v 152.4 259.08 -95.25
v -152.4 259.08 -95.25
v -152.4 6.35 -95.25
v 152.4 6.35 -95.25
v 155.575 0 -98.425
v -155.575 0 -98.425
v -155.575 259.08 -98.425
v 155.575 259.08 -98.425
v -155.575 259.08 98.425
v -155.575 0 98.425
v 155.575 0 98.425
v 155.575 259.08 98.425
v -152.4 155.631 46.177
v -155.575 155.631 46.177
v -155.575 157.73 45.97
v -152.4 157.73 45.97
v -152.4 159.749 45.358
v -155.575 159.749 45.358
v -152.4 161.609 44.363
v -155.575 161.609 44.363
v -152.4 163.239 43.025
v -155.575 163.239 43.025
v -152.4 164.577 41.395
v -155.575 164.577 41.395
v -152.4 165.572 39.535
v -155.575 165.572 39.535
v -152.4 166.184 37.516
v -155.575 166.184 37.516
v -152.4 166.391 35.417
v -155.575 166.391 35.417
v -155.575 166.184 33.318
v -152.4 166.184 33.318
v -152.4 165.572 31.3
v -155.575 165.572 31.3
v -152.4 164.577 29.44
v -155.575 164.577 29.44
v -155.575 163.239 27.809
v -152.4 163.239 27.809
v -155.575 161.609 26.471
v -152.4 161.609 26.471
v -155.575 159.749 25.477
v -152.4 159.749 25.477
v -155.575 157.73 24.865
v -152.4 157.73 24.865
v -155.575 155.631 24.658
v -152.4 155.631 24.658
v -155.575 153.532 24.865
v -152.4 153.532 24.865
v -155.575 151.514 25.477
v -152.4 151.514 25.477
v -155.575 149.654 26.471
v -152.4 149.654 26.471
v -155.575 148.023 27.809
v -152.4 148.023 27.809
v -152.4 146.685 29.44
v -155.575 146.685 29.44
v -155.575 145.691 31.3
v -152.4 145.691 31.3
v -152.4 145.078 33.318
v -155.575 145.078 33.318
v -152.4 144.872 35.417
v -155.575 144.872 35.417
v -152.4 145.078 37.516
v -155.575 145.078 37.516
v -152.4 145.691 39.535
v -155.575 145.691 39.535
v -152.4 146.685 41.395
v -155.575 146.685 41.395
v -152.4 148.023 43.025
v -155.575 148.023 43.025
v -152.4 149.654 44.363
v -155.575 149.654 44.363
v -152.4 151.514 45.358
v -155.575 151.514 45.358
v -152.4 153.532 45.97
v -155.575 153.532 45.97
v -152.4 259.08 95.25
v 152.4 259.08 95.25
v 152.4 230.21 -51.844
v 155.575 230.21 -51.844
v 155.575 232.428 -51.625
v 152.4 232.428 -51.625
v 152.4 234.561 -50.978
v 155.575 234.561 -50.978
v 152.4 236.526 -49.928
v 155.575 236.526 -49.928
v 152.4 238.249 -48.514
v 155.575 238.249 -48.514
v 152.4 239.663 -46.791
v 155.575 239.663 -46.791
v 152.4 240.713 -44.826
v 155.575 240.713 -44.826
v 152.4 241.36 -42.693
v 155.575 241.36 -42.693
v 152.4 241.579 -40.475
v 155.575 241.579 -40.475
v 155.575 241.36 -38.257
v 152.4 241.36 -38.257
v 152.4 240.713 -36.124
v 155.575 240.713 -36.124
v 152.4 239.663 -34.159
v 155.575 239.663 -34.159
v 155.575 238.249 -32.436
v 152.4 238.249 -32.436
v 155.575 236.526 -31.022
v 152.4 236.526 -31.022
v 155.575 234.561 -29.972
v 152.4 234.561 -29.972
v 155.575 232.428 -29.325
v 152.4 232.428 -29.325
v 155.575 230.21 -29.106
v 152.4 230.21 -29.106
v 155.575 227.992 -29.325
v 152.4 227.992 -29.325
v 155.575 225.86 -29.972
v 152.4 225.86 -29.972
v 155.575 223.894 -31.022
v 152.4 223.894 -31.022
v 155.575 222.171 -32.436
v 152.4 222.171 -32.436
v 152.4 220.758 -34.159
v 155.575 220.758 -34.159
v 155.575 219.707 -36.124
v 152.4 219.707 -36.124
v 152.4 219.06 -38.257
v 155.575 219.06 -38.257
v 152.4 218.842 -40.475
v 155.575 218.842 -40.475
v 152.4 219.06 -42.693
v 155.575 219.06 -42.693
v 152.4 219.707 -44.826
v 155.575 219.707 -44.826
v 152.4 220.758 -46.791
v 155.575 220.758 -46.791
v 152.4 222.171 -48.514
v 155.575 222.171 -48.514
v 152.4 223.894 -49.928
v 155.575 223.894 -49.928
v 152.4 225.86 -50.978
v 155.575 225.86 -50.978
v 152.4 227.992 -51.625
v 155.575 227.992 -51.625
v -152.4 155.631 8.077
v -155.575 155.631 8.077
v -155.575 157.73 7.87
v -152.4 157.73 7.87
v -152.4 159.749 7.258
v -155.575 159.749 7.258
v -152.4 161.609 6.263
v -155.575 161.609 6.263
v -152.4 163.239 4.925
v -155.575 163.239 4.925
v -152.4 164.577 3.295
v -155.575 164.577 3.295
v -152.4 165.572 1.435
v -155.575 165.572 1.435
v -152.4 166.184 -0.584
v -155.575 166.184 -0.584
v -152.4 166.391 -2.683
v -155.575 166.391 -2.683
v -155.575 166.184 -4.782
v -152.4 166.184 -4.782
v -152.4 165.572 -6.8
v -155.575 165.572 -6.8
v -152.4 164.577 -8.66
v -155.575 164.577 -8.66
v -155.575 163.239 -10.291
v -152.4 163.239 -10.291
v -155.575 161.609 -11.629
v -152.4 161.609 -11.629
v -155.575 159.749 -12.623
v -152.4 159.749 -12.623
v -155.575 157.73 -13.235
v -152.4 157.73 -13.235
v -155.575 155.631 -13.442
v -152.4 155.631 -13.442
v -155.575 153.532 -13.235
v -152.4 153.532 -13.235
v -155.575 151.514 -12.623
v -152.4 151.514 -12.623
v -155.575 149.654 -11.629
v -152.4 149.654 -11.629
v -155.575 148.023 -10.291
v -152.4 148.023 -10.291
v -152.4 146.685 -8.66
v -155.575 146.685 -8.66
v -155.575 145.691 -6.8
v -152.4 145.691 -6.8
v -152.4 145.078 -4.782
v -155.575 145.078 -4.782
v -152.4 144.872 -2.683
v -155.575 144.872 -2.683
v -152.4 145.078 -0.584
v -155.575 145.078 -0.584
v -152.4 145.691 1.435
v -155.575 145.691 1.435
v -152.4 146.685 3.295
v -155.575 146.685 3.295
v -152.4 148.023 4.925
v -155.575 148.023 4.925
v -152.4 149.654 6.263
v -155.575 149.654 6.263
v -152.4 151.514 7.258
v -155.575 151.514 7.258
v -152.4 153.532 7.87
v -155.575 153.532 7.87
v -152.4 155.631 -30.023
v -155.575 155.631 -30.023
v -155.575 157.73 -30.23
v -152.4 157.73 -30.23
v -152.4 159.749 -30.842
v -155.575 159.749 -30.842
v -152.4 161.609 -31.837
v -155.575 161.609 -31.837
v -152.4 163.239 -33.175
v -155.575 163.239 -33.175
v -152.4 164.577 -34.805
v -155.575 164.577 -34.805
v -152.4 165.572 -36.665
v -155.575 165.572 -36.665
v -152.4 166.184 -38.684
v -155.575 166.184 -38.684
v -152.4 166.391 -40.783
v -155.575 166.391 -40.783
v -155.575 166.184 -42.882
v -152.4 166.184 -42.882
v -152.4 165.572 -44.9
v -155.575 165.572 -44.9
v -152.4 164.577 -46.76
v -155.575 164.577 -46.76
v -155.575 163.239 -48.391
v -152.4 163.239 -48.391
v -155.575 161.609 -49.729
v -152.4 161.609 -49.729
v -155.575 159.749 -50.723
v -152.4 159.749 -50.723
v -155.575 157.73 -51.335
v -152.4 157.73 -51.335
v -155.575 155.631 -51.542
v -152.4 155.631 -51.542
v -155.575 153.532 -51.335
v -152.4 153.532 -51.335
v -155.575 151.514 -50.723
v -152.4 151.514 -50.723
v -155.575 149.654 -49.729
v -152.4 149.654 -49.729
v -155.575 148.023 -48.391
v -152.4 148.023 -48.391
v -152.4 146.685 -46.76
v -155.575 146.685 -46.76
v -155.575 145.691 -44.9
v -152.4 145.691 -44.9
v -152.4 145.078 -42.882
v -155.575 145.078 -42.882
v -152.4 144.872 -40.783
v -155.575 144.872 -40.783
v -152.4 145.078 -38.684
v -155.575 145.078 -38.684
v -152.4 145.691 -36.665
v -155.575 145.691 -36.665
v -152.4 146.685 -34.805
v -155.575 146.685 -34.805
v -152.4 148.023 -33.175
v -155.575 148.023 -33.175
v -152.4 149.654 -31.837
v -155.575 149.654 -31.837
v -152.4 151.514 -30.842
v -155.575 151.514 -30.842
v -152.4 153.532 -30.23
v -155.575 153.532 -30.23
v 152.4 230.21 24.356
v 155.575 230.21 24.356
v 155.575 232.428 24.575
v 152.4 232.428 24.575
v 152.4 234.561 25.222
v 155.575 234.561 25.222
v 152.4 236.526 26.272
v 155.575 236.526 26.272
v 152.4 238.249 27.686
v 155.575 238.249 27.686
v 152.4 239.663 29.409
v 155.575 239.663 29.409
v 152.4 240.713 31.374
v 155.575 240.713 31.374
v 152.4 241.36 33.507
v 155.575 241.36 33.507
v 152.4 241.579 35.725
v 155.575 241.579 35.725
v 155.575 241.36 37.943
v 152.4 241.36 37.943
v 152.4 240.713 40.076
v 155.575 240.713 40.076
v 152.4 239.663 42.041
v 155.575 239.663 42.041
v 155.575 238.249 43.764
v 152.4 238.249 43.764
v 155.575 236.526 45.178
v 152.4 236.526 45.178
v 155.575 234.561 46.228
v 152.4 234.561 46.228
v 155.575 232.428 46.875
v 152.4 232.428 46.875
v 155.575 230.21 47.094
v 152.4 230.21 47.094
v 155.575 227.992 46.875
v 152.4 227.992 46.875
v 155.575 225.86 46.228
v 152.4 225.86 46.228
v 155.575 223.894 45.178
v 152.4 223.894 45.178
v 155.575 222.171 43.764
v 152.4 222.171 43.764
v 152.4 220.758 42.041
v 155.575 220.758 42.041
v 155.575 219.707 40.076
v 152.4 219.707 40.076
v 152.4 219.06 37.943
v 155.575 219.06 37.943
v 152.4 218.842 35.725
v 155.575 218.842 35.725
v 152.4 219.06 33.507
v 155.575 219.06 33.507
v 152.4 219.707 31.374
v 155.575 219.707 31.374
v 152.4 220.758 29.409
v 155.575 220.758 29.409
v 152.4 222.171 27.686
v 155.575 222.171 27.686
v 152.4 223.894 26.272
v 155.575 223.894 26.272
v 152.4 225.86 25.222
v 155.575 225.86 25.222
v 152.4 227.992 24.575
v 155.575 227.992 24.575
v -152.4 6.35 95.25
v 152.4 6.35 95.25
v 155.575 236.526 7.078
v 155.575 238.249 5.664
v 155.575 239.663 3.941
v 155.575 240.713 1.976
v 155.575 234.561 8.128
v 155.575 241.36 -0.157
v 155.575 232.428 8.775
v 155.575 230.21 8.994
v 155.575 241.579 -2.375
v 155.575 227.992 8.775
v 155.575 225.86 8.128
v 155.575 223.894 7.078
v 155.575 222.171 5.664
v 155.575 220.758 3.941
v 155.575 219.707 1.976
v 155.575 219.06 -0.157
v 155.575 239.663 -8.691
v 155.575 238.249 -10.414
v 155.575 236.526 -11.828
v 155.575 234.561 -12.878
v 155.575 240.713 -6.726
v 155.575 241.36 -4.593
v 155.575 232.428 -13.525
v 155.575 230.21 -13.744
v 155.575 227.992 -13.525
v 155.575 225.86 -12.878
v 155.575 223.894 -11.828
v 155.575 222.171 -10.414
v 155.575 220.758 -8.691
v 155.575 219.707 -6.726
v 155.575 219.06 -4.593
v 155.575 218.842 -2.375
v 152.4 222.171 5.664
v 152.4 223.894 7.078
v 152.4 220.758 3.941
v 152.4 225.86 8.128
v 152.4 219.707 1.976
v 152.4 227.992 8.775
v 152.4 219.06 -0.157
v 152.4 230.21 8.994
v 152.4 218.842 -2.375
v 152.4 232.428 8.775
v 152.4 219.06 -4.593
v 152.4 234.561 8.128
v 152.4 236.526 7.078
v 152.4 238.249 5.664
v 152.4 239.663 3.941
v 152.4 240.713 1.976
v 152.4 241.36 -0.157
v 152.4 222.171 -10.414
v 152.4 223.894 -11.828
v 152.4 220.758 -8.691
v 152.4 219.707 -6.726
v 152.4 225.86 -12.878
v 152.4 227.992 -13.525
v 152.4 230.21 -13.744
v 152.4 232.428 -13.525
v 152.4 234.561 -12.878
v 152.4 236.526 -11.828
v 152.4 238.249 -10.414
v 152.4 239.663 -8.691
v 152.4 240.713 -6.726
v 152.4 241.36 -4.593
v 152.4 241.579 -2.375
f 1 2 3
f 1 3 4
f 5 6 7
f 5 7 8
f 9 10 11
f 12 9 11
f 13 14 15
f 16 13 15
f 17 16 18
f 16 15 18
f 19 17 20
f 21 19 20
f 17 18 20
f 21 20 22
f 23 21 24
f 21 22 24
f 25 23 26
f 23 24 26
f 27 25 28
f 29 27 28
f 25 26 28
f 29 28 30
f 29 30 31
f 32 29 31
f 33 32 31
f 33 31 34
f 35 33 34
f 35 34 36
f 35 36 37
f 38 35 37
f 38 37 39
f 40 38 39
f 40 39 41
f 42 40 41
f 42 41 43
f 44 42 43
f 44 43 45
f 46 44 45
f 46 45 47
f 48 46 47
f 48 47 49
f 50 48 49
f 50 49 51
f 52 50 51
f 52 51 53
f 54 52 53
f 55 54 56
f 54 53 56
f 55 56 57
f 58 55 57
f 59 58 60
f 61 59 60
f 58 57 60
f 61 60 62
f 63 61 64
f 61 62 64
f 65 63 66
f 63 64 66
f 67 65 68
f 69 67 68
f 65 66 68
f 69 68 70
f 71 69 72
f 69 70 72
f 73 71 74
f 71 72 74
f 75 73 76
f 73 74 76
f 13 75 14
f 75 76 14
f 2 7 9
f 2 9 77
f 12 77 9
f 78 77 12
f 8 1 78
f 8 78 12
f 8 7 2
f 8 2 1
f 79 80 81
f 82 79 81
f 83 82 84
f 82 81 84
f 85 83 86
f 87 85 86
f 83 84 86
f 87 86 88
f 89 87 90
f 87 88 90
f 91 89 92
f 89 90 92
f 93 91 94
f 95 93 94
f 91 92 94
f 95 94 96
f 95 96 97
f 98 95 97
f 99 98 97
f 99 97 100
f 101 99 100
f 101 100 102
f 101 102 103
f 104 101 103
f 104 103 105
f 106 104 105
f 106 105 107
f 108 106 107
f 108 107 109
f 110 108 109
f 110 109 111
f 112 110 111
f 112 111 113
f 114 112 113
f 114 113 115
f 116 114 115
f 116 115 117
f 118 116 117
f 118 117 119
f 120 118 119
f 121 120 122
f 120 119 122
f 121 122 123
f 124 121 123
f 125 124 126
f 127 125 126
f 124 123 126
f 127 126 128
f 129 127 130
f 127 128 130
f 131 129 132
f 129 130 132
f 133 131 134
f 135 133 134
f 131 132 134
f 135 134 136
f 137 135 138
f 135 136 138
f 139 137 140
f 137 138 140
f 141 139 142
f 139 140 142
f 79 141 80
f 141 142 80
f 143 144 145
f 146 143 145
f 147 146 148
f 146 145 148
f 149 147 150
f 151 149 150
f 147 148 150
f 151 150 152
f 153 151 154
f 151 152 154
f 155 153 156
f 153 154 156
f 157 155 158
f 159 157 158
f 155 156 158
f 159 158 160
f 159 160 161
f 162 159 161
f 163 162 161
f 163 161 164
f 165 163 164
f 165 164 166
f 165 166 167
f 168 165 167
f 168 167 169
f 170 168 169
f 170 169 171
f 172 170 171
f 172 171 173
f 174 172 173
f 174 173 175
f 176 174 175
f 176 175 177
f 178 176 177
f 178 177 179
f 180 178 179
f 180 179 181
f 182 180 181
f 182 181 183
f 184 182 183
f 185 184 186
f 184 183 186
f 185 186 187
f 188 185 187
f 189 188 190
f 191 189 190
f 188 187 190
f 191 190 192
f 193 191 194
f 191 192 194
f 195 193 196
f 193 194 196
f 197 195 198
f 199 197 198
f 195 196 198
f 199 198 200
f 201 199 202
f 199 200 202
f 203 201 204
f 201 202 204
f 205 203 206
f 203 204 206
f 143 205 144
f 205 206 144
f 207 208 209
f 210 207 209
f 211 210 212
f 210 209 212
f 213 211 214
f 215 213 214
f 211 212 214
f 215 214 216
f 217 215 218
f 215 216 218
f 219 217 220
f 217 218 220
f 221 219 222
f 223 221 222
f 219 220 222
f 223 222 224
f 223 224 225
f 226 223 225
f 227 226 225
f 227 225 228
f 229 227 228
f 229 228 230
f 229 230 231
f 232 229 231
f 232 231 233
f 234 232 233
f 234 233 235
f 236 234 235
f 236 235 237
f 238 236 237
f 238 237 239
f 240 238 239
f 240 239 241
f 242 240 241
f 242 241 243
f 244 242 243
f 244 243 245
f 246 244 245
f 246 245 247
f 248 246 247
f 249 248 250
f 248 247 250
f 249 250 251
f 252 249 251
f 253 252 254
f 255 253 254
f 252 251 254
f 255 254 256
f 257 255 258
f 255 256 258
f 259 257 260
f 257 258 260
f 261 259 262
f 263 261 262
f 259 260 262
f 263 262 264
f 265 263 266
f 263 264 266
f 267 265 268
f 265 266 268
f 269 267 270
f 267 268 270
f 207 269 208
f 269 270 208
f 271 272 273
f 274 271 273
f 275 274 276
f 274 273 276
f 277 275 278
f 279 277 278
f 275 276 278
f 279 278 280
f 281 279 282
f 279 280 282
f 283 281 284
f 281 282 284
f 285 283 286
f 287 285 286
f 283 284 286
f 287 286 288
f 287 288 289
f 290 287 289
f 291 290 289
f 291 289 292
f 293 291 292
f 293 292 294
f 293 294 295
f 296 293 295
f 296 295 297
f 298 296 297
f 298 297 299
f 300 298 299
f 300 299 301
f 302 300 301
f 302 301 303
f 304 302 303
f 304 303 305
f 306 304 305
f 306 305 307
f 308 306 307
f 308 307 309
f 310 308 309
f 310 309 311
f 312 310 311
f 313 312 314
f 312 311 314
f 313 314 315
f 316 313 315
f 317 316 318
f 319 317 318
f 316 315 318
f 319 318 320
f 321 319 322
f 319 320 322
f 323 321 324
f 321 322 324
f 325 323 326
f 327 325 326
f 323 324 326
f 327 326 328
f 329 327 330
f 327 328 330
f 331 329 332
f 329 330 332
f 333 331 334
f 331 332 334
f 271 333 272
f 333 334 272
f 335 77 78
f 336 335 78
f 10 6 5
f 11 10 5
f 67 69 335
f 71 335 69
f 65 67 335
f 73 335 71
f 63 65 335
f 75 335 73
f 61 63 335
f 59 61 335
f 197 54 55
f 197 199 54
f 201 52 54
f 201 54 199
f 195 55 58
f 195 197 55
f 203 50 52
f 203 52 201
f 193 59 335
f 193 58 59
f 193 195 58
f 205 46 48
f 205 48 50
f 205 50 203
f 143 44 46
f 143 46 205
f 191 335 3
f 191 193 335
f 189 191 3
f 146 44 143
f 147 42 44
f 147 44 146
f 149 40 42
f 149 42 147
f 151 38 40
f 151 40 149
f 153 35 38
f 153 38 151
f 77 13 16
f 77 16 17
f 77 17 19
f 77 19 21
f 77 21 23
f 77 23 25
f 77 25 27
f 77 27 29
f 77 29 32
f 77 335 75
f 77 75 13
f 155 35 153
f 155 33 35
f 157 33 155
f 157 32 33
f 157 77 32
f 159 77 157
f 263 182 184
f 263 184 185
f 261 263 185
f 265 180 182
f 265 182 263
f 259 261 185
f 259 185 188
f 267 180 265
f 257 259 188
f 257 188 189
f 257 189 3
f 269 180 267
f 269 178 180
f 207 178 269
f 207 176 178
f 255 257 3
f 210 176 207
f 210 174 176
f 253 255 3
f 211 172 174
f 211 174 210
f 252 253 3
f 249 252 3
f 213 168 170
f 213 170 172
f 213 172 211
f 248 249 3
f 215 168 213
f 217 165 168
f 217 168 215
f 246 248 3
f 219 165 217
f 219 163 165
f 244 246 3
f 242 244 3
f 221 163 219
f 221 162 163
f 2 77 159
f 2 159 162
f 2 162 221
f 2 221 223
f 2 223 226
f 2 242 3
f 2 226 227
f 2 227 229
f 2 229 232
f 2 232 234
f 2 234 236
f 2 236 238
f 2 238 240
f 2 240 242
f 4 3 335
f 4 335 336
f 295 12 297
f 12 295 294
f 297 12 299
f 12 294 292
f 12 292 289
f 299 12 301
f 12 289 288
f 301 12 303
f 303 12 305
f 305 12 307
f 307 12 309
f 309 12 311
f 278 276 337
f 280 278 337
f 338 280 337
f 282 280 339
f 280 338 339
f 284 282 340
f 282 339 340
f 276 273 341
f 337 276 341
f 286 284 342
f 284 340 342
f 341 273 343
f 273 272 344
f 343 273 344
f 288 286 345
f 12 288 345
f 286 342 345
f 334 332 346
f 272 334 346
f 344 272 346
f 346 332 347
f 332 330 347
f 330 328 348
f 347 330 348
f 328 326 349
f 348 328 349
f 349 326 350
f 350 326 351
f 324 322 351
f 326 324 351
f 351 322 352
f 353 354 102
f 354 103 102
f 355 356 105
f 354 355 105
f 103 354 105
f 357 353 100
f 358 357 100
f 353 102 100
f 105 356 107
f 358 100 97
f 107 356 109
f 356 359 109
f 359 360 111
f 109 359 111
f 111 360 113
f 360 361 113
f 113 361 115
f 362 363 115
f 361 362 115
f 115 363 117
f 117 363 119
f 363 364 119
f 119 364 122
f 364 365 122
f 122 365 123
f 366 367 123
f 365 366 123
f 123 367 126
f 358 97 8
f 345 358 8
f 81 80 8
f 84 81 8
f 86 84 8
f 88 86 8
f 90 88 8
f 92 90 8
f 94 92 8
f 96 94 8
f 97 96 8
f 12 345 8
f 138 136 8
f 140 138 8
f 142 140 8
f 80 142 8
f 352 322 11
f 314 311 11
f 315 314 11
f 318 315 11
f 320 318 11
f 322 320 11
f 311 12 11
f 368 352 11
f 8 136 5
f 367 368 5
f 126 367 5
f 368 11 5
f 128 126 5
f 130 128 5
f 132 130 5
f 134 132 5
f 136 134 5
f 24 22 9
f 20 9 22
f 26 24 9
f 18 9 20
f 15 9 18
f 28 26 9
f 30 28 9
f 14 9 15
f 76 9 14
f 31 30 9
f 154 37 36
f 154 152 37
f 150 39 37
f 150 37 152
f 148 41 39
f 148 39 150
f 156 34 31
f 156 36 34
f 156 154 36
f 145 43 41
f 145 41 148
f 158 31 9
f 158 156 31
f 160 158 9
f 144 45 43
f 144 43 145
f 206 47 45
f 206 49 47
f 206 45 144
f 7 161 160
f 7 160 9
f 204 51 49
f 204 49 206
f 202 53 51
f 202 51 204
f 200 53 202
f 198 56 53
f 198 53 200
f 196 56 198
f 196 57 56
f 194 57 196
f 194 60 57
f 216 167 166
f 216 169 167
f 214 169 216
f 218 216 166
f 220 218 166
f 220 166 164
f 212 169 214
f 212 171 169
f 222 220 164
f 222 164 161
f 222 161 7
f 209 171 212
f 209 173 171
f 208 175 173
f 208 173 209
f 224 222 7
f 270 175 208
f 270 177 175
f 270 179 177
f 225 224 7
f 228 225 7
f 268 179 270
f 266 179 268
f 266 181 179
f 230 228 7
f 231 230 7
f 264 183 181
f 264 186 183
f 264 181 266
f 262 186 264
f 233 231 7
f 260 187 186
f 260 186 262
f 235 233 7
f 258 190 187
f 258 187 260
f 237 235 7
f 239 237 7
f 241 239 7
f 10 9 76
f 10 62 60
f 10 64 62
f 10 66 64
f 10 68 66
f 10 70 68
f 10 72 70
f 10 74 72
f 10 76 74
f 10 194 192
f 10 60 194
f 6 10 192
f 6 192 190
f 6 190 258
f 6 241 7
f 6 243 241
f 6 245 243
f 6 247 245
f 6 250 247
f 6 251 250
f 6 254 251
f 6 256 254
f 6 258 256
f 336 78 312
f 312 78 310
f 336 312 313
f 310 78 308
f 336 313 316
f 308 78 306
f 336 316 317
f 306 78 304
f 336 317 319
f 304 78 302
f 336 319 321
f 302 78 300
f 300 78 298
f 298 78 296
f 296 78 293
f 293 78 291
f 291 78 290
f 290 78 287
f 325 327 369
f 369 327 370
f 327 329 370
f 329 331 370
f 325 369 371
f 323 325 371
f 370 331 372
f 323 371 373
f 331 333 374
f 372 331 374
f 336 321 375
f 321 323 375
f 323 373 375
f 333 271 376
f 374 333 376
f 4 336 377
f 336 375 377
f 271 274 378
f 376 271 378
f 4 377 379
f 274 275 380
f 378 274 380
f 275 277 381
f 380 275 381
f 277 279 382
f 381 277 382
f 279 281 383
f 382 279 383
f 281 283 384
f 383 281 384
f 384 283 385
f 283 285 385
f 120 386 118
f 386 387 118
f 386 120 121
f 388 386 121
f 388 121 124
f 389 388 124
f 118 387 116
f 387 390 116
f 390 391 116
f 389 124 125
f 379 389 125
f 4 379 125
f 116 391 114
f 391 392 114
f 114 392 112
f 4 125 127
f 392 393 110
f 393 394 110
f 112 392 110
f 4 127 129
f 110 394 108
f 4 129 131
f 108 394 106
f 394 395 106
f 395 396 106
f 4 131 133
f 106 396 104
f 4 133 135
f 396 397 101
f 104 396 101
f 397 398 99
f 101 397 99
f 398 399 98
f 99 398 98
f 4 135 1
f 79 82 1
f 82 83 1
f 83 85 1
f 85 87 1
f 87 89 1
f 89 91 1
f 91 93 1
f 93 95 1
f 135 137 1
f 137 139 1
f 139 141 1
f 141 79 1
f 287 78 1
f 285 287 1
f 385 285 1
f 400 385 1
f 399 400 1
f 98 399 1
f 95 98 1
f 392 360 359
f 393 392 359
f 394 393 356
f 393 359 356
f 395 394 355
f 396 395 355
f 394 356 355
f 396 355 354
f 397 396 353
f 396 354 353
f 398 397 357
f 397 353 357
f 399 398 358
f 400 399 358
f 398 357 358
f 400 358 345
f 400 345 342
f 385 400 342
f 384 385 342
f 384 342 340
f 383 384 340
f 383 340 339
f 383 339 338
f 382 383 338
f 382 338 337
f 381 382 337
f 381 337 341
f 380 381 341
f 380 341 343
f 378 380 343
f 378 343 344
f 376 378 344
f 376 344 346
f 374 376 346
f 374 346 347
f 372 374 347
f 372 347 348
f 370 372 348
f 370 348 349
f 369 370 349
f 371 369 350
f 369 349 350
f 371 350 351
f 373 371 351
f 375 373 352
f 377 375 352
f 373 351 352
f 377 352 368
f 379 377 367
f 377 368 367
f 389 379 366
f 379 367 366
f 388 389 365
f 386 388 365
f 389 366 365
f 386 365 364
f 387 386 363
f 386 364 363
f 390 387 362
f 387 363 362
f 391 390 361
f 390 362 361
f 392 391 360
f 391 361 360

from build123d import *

# Parameters (mm, degrees)
SKETCH1_W                = 152.4
SKETCH1_H                = 190.5
BOSS_EXTRUDE1_DEPTH      = 5.08
BOSS_EXTRUDE2_DEPTH      = 254
BOSS_EXTRUDE2_DEPTH_BACK = 5.08
SKETCH2_W                = 311.15
SKETCH2_H                = 196.85
SKETCH3_W                = 304.8
SKETCH3_H                = 190.5
CUT_EXTRUDE1_DEPTH       = 252.73
SKETCH4_R                = 10.75942509
CUT_EXTRUDE2_DEPTH       = 252.73
SKETCH5_R                = 11.36861001
CUT_EXTRUDE3_DEPTH       = 252.73


with BuildPart() as part:
    # Sketch1 → Boss-Extrude1 (new body)
    with BuildSketch(Plane(origin=(0, 0, 0), x_dir=(1, 0, 0), z_dir=(0, 1, 0))):
        with Locations((-76.2, 0)):
            Rectangle(SKETCH1_W, SKETCH1_H)
    extrude(amount=BOSS_EXTRUDE1_DEPTH)

    # Sketch2 → Boss-Extrude2 (add, two sides: drawn at the far end of the back side and taken through both)
    with BuildSketch(Plane(origin=(0, 5.08, 0), x_dir=(1, 0, 0), z_dir=(0, 1, 0)).offset(-BOSS_EXTRUDE2_DEPTH_BACK)):
        Rectangle(SKETCH2_W, SKETCH2_H)
    extrude(amount=BOSS_EXTRUDE2_DEPTH + BOSS_EXTRUDE2_DEPTH_BACK)

    # Sketch3 → Cut-Extrude1 (cut)
    with BuildSketch(Plane(origin=(0, 259.08, 0), x_dir=(1, 0, 0), z_dir=(0, 1, 0))):
        Rectangle(SKETCH3_W, SKETCH3_H)
    extrude(amount=-CUT_EXTRUDE1_DEPTH, mode=Mode.SUBTRACT)

    # Sketch4 → Cut-Extrude2 (cut)
    with BuildSketch(Plane.ZY.offset(155.575)):
        with Locations((-40.782647245, 155.631127926)):
            Circle(SKETCH4_R)
        with Locations((-2.682647245, 155.631127926)):
            Circle(SKETCH4_R)
        with Locations((35.417352755, 155.631127926)):
            Circle(SKETCH4_R)
    extrude(amount=-CUT_EXTRUDE2_DEPTH, mode=Mode.SUBTRACT)

    # Sketch5 → Cut-Extrude3 (cut)
    with BuildSketch(Plane(origin=(155.575, 0, 0), x_dir=(0, 0, -1), z_dir=(1, 0, 0))):
        with Locations((-35.725024922, 230.210156067)):
            Circle(SKETCH5_R)
        with Locations((2.374975078, 230.210156067)):
            Circle(SKETCH5_R)
        with Locations((40.474975078, 230.210156067)):
            Circle(SKETCH5_R)
    extrude(amount=-CUT_EXTRUDE3_DEPTH, mode=Mode.SUBTRACT)


solid = part.part
